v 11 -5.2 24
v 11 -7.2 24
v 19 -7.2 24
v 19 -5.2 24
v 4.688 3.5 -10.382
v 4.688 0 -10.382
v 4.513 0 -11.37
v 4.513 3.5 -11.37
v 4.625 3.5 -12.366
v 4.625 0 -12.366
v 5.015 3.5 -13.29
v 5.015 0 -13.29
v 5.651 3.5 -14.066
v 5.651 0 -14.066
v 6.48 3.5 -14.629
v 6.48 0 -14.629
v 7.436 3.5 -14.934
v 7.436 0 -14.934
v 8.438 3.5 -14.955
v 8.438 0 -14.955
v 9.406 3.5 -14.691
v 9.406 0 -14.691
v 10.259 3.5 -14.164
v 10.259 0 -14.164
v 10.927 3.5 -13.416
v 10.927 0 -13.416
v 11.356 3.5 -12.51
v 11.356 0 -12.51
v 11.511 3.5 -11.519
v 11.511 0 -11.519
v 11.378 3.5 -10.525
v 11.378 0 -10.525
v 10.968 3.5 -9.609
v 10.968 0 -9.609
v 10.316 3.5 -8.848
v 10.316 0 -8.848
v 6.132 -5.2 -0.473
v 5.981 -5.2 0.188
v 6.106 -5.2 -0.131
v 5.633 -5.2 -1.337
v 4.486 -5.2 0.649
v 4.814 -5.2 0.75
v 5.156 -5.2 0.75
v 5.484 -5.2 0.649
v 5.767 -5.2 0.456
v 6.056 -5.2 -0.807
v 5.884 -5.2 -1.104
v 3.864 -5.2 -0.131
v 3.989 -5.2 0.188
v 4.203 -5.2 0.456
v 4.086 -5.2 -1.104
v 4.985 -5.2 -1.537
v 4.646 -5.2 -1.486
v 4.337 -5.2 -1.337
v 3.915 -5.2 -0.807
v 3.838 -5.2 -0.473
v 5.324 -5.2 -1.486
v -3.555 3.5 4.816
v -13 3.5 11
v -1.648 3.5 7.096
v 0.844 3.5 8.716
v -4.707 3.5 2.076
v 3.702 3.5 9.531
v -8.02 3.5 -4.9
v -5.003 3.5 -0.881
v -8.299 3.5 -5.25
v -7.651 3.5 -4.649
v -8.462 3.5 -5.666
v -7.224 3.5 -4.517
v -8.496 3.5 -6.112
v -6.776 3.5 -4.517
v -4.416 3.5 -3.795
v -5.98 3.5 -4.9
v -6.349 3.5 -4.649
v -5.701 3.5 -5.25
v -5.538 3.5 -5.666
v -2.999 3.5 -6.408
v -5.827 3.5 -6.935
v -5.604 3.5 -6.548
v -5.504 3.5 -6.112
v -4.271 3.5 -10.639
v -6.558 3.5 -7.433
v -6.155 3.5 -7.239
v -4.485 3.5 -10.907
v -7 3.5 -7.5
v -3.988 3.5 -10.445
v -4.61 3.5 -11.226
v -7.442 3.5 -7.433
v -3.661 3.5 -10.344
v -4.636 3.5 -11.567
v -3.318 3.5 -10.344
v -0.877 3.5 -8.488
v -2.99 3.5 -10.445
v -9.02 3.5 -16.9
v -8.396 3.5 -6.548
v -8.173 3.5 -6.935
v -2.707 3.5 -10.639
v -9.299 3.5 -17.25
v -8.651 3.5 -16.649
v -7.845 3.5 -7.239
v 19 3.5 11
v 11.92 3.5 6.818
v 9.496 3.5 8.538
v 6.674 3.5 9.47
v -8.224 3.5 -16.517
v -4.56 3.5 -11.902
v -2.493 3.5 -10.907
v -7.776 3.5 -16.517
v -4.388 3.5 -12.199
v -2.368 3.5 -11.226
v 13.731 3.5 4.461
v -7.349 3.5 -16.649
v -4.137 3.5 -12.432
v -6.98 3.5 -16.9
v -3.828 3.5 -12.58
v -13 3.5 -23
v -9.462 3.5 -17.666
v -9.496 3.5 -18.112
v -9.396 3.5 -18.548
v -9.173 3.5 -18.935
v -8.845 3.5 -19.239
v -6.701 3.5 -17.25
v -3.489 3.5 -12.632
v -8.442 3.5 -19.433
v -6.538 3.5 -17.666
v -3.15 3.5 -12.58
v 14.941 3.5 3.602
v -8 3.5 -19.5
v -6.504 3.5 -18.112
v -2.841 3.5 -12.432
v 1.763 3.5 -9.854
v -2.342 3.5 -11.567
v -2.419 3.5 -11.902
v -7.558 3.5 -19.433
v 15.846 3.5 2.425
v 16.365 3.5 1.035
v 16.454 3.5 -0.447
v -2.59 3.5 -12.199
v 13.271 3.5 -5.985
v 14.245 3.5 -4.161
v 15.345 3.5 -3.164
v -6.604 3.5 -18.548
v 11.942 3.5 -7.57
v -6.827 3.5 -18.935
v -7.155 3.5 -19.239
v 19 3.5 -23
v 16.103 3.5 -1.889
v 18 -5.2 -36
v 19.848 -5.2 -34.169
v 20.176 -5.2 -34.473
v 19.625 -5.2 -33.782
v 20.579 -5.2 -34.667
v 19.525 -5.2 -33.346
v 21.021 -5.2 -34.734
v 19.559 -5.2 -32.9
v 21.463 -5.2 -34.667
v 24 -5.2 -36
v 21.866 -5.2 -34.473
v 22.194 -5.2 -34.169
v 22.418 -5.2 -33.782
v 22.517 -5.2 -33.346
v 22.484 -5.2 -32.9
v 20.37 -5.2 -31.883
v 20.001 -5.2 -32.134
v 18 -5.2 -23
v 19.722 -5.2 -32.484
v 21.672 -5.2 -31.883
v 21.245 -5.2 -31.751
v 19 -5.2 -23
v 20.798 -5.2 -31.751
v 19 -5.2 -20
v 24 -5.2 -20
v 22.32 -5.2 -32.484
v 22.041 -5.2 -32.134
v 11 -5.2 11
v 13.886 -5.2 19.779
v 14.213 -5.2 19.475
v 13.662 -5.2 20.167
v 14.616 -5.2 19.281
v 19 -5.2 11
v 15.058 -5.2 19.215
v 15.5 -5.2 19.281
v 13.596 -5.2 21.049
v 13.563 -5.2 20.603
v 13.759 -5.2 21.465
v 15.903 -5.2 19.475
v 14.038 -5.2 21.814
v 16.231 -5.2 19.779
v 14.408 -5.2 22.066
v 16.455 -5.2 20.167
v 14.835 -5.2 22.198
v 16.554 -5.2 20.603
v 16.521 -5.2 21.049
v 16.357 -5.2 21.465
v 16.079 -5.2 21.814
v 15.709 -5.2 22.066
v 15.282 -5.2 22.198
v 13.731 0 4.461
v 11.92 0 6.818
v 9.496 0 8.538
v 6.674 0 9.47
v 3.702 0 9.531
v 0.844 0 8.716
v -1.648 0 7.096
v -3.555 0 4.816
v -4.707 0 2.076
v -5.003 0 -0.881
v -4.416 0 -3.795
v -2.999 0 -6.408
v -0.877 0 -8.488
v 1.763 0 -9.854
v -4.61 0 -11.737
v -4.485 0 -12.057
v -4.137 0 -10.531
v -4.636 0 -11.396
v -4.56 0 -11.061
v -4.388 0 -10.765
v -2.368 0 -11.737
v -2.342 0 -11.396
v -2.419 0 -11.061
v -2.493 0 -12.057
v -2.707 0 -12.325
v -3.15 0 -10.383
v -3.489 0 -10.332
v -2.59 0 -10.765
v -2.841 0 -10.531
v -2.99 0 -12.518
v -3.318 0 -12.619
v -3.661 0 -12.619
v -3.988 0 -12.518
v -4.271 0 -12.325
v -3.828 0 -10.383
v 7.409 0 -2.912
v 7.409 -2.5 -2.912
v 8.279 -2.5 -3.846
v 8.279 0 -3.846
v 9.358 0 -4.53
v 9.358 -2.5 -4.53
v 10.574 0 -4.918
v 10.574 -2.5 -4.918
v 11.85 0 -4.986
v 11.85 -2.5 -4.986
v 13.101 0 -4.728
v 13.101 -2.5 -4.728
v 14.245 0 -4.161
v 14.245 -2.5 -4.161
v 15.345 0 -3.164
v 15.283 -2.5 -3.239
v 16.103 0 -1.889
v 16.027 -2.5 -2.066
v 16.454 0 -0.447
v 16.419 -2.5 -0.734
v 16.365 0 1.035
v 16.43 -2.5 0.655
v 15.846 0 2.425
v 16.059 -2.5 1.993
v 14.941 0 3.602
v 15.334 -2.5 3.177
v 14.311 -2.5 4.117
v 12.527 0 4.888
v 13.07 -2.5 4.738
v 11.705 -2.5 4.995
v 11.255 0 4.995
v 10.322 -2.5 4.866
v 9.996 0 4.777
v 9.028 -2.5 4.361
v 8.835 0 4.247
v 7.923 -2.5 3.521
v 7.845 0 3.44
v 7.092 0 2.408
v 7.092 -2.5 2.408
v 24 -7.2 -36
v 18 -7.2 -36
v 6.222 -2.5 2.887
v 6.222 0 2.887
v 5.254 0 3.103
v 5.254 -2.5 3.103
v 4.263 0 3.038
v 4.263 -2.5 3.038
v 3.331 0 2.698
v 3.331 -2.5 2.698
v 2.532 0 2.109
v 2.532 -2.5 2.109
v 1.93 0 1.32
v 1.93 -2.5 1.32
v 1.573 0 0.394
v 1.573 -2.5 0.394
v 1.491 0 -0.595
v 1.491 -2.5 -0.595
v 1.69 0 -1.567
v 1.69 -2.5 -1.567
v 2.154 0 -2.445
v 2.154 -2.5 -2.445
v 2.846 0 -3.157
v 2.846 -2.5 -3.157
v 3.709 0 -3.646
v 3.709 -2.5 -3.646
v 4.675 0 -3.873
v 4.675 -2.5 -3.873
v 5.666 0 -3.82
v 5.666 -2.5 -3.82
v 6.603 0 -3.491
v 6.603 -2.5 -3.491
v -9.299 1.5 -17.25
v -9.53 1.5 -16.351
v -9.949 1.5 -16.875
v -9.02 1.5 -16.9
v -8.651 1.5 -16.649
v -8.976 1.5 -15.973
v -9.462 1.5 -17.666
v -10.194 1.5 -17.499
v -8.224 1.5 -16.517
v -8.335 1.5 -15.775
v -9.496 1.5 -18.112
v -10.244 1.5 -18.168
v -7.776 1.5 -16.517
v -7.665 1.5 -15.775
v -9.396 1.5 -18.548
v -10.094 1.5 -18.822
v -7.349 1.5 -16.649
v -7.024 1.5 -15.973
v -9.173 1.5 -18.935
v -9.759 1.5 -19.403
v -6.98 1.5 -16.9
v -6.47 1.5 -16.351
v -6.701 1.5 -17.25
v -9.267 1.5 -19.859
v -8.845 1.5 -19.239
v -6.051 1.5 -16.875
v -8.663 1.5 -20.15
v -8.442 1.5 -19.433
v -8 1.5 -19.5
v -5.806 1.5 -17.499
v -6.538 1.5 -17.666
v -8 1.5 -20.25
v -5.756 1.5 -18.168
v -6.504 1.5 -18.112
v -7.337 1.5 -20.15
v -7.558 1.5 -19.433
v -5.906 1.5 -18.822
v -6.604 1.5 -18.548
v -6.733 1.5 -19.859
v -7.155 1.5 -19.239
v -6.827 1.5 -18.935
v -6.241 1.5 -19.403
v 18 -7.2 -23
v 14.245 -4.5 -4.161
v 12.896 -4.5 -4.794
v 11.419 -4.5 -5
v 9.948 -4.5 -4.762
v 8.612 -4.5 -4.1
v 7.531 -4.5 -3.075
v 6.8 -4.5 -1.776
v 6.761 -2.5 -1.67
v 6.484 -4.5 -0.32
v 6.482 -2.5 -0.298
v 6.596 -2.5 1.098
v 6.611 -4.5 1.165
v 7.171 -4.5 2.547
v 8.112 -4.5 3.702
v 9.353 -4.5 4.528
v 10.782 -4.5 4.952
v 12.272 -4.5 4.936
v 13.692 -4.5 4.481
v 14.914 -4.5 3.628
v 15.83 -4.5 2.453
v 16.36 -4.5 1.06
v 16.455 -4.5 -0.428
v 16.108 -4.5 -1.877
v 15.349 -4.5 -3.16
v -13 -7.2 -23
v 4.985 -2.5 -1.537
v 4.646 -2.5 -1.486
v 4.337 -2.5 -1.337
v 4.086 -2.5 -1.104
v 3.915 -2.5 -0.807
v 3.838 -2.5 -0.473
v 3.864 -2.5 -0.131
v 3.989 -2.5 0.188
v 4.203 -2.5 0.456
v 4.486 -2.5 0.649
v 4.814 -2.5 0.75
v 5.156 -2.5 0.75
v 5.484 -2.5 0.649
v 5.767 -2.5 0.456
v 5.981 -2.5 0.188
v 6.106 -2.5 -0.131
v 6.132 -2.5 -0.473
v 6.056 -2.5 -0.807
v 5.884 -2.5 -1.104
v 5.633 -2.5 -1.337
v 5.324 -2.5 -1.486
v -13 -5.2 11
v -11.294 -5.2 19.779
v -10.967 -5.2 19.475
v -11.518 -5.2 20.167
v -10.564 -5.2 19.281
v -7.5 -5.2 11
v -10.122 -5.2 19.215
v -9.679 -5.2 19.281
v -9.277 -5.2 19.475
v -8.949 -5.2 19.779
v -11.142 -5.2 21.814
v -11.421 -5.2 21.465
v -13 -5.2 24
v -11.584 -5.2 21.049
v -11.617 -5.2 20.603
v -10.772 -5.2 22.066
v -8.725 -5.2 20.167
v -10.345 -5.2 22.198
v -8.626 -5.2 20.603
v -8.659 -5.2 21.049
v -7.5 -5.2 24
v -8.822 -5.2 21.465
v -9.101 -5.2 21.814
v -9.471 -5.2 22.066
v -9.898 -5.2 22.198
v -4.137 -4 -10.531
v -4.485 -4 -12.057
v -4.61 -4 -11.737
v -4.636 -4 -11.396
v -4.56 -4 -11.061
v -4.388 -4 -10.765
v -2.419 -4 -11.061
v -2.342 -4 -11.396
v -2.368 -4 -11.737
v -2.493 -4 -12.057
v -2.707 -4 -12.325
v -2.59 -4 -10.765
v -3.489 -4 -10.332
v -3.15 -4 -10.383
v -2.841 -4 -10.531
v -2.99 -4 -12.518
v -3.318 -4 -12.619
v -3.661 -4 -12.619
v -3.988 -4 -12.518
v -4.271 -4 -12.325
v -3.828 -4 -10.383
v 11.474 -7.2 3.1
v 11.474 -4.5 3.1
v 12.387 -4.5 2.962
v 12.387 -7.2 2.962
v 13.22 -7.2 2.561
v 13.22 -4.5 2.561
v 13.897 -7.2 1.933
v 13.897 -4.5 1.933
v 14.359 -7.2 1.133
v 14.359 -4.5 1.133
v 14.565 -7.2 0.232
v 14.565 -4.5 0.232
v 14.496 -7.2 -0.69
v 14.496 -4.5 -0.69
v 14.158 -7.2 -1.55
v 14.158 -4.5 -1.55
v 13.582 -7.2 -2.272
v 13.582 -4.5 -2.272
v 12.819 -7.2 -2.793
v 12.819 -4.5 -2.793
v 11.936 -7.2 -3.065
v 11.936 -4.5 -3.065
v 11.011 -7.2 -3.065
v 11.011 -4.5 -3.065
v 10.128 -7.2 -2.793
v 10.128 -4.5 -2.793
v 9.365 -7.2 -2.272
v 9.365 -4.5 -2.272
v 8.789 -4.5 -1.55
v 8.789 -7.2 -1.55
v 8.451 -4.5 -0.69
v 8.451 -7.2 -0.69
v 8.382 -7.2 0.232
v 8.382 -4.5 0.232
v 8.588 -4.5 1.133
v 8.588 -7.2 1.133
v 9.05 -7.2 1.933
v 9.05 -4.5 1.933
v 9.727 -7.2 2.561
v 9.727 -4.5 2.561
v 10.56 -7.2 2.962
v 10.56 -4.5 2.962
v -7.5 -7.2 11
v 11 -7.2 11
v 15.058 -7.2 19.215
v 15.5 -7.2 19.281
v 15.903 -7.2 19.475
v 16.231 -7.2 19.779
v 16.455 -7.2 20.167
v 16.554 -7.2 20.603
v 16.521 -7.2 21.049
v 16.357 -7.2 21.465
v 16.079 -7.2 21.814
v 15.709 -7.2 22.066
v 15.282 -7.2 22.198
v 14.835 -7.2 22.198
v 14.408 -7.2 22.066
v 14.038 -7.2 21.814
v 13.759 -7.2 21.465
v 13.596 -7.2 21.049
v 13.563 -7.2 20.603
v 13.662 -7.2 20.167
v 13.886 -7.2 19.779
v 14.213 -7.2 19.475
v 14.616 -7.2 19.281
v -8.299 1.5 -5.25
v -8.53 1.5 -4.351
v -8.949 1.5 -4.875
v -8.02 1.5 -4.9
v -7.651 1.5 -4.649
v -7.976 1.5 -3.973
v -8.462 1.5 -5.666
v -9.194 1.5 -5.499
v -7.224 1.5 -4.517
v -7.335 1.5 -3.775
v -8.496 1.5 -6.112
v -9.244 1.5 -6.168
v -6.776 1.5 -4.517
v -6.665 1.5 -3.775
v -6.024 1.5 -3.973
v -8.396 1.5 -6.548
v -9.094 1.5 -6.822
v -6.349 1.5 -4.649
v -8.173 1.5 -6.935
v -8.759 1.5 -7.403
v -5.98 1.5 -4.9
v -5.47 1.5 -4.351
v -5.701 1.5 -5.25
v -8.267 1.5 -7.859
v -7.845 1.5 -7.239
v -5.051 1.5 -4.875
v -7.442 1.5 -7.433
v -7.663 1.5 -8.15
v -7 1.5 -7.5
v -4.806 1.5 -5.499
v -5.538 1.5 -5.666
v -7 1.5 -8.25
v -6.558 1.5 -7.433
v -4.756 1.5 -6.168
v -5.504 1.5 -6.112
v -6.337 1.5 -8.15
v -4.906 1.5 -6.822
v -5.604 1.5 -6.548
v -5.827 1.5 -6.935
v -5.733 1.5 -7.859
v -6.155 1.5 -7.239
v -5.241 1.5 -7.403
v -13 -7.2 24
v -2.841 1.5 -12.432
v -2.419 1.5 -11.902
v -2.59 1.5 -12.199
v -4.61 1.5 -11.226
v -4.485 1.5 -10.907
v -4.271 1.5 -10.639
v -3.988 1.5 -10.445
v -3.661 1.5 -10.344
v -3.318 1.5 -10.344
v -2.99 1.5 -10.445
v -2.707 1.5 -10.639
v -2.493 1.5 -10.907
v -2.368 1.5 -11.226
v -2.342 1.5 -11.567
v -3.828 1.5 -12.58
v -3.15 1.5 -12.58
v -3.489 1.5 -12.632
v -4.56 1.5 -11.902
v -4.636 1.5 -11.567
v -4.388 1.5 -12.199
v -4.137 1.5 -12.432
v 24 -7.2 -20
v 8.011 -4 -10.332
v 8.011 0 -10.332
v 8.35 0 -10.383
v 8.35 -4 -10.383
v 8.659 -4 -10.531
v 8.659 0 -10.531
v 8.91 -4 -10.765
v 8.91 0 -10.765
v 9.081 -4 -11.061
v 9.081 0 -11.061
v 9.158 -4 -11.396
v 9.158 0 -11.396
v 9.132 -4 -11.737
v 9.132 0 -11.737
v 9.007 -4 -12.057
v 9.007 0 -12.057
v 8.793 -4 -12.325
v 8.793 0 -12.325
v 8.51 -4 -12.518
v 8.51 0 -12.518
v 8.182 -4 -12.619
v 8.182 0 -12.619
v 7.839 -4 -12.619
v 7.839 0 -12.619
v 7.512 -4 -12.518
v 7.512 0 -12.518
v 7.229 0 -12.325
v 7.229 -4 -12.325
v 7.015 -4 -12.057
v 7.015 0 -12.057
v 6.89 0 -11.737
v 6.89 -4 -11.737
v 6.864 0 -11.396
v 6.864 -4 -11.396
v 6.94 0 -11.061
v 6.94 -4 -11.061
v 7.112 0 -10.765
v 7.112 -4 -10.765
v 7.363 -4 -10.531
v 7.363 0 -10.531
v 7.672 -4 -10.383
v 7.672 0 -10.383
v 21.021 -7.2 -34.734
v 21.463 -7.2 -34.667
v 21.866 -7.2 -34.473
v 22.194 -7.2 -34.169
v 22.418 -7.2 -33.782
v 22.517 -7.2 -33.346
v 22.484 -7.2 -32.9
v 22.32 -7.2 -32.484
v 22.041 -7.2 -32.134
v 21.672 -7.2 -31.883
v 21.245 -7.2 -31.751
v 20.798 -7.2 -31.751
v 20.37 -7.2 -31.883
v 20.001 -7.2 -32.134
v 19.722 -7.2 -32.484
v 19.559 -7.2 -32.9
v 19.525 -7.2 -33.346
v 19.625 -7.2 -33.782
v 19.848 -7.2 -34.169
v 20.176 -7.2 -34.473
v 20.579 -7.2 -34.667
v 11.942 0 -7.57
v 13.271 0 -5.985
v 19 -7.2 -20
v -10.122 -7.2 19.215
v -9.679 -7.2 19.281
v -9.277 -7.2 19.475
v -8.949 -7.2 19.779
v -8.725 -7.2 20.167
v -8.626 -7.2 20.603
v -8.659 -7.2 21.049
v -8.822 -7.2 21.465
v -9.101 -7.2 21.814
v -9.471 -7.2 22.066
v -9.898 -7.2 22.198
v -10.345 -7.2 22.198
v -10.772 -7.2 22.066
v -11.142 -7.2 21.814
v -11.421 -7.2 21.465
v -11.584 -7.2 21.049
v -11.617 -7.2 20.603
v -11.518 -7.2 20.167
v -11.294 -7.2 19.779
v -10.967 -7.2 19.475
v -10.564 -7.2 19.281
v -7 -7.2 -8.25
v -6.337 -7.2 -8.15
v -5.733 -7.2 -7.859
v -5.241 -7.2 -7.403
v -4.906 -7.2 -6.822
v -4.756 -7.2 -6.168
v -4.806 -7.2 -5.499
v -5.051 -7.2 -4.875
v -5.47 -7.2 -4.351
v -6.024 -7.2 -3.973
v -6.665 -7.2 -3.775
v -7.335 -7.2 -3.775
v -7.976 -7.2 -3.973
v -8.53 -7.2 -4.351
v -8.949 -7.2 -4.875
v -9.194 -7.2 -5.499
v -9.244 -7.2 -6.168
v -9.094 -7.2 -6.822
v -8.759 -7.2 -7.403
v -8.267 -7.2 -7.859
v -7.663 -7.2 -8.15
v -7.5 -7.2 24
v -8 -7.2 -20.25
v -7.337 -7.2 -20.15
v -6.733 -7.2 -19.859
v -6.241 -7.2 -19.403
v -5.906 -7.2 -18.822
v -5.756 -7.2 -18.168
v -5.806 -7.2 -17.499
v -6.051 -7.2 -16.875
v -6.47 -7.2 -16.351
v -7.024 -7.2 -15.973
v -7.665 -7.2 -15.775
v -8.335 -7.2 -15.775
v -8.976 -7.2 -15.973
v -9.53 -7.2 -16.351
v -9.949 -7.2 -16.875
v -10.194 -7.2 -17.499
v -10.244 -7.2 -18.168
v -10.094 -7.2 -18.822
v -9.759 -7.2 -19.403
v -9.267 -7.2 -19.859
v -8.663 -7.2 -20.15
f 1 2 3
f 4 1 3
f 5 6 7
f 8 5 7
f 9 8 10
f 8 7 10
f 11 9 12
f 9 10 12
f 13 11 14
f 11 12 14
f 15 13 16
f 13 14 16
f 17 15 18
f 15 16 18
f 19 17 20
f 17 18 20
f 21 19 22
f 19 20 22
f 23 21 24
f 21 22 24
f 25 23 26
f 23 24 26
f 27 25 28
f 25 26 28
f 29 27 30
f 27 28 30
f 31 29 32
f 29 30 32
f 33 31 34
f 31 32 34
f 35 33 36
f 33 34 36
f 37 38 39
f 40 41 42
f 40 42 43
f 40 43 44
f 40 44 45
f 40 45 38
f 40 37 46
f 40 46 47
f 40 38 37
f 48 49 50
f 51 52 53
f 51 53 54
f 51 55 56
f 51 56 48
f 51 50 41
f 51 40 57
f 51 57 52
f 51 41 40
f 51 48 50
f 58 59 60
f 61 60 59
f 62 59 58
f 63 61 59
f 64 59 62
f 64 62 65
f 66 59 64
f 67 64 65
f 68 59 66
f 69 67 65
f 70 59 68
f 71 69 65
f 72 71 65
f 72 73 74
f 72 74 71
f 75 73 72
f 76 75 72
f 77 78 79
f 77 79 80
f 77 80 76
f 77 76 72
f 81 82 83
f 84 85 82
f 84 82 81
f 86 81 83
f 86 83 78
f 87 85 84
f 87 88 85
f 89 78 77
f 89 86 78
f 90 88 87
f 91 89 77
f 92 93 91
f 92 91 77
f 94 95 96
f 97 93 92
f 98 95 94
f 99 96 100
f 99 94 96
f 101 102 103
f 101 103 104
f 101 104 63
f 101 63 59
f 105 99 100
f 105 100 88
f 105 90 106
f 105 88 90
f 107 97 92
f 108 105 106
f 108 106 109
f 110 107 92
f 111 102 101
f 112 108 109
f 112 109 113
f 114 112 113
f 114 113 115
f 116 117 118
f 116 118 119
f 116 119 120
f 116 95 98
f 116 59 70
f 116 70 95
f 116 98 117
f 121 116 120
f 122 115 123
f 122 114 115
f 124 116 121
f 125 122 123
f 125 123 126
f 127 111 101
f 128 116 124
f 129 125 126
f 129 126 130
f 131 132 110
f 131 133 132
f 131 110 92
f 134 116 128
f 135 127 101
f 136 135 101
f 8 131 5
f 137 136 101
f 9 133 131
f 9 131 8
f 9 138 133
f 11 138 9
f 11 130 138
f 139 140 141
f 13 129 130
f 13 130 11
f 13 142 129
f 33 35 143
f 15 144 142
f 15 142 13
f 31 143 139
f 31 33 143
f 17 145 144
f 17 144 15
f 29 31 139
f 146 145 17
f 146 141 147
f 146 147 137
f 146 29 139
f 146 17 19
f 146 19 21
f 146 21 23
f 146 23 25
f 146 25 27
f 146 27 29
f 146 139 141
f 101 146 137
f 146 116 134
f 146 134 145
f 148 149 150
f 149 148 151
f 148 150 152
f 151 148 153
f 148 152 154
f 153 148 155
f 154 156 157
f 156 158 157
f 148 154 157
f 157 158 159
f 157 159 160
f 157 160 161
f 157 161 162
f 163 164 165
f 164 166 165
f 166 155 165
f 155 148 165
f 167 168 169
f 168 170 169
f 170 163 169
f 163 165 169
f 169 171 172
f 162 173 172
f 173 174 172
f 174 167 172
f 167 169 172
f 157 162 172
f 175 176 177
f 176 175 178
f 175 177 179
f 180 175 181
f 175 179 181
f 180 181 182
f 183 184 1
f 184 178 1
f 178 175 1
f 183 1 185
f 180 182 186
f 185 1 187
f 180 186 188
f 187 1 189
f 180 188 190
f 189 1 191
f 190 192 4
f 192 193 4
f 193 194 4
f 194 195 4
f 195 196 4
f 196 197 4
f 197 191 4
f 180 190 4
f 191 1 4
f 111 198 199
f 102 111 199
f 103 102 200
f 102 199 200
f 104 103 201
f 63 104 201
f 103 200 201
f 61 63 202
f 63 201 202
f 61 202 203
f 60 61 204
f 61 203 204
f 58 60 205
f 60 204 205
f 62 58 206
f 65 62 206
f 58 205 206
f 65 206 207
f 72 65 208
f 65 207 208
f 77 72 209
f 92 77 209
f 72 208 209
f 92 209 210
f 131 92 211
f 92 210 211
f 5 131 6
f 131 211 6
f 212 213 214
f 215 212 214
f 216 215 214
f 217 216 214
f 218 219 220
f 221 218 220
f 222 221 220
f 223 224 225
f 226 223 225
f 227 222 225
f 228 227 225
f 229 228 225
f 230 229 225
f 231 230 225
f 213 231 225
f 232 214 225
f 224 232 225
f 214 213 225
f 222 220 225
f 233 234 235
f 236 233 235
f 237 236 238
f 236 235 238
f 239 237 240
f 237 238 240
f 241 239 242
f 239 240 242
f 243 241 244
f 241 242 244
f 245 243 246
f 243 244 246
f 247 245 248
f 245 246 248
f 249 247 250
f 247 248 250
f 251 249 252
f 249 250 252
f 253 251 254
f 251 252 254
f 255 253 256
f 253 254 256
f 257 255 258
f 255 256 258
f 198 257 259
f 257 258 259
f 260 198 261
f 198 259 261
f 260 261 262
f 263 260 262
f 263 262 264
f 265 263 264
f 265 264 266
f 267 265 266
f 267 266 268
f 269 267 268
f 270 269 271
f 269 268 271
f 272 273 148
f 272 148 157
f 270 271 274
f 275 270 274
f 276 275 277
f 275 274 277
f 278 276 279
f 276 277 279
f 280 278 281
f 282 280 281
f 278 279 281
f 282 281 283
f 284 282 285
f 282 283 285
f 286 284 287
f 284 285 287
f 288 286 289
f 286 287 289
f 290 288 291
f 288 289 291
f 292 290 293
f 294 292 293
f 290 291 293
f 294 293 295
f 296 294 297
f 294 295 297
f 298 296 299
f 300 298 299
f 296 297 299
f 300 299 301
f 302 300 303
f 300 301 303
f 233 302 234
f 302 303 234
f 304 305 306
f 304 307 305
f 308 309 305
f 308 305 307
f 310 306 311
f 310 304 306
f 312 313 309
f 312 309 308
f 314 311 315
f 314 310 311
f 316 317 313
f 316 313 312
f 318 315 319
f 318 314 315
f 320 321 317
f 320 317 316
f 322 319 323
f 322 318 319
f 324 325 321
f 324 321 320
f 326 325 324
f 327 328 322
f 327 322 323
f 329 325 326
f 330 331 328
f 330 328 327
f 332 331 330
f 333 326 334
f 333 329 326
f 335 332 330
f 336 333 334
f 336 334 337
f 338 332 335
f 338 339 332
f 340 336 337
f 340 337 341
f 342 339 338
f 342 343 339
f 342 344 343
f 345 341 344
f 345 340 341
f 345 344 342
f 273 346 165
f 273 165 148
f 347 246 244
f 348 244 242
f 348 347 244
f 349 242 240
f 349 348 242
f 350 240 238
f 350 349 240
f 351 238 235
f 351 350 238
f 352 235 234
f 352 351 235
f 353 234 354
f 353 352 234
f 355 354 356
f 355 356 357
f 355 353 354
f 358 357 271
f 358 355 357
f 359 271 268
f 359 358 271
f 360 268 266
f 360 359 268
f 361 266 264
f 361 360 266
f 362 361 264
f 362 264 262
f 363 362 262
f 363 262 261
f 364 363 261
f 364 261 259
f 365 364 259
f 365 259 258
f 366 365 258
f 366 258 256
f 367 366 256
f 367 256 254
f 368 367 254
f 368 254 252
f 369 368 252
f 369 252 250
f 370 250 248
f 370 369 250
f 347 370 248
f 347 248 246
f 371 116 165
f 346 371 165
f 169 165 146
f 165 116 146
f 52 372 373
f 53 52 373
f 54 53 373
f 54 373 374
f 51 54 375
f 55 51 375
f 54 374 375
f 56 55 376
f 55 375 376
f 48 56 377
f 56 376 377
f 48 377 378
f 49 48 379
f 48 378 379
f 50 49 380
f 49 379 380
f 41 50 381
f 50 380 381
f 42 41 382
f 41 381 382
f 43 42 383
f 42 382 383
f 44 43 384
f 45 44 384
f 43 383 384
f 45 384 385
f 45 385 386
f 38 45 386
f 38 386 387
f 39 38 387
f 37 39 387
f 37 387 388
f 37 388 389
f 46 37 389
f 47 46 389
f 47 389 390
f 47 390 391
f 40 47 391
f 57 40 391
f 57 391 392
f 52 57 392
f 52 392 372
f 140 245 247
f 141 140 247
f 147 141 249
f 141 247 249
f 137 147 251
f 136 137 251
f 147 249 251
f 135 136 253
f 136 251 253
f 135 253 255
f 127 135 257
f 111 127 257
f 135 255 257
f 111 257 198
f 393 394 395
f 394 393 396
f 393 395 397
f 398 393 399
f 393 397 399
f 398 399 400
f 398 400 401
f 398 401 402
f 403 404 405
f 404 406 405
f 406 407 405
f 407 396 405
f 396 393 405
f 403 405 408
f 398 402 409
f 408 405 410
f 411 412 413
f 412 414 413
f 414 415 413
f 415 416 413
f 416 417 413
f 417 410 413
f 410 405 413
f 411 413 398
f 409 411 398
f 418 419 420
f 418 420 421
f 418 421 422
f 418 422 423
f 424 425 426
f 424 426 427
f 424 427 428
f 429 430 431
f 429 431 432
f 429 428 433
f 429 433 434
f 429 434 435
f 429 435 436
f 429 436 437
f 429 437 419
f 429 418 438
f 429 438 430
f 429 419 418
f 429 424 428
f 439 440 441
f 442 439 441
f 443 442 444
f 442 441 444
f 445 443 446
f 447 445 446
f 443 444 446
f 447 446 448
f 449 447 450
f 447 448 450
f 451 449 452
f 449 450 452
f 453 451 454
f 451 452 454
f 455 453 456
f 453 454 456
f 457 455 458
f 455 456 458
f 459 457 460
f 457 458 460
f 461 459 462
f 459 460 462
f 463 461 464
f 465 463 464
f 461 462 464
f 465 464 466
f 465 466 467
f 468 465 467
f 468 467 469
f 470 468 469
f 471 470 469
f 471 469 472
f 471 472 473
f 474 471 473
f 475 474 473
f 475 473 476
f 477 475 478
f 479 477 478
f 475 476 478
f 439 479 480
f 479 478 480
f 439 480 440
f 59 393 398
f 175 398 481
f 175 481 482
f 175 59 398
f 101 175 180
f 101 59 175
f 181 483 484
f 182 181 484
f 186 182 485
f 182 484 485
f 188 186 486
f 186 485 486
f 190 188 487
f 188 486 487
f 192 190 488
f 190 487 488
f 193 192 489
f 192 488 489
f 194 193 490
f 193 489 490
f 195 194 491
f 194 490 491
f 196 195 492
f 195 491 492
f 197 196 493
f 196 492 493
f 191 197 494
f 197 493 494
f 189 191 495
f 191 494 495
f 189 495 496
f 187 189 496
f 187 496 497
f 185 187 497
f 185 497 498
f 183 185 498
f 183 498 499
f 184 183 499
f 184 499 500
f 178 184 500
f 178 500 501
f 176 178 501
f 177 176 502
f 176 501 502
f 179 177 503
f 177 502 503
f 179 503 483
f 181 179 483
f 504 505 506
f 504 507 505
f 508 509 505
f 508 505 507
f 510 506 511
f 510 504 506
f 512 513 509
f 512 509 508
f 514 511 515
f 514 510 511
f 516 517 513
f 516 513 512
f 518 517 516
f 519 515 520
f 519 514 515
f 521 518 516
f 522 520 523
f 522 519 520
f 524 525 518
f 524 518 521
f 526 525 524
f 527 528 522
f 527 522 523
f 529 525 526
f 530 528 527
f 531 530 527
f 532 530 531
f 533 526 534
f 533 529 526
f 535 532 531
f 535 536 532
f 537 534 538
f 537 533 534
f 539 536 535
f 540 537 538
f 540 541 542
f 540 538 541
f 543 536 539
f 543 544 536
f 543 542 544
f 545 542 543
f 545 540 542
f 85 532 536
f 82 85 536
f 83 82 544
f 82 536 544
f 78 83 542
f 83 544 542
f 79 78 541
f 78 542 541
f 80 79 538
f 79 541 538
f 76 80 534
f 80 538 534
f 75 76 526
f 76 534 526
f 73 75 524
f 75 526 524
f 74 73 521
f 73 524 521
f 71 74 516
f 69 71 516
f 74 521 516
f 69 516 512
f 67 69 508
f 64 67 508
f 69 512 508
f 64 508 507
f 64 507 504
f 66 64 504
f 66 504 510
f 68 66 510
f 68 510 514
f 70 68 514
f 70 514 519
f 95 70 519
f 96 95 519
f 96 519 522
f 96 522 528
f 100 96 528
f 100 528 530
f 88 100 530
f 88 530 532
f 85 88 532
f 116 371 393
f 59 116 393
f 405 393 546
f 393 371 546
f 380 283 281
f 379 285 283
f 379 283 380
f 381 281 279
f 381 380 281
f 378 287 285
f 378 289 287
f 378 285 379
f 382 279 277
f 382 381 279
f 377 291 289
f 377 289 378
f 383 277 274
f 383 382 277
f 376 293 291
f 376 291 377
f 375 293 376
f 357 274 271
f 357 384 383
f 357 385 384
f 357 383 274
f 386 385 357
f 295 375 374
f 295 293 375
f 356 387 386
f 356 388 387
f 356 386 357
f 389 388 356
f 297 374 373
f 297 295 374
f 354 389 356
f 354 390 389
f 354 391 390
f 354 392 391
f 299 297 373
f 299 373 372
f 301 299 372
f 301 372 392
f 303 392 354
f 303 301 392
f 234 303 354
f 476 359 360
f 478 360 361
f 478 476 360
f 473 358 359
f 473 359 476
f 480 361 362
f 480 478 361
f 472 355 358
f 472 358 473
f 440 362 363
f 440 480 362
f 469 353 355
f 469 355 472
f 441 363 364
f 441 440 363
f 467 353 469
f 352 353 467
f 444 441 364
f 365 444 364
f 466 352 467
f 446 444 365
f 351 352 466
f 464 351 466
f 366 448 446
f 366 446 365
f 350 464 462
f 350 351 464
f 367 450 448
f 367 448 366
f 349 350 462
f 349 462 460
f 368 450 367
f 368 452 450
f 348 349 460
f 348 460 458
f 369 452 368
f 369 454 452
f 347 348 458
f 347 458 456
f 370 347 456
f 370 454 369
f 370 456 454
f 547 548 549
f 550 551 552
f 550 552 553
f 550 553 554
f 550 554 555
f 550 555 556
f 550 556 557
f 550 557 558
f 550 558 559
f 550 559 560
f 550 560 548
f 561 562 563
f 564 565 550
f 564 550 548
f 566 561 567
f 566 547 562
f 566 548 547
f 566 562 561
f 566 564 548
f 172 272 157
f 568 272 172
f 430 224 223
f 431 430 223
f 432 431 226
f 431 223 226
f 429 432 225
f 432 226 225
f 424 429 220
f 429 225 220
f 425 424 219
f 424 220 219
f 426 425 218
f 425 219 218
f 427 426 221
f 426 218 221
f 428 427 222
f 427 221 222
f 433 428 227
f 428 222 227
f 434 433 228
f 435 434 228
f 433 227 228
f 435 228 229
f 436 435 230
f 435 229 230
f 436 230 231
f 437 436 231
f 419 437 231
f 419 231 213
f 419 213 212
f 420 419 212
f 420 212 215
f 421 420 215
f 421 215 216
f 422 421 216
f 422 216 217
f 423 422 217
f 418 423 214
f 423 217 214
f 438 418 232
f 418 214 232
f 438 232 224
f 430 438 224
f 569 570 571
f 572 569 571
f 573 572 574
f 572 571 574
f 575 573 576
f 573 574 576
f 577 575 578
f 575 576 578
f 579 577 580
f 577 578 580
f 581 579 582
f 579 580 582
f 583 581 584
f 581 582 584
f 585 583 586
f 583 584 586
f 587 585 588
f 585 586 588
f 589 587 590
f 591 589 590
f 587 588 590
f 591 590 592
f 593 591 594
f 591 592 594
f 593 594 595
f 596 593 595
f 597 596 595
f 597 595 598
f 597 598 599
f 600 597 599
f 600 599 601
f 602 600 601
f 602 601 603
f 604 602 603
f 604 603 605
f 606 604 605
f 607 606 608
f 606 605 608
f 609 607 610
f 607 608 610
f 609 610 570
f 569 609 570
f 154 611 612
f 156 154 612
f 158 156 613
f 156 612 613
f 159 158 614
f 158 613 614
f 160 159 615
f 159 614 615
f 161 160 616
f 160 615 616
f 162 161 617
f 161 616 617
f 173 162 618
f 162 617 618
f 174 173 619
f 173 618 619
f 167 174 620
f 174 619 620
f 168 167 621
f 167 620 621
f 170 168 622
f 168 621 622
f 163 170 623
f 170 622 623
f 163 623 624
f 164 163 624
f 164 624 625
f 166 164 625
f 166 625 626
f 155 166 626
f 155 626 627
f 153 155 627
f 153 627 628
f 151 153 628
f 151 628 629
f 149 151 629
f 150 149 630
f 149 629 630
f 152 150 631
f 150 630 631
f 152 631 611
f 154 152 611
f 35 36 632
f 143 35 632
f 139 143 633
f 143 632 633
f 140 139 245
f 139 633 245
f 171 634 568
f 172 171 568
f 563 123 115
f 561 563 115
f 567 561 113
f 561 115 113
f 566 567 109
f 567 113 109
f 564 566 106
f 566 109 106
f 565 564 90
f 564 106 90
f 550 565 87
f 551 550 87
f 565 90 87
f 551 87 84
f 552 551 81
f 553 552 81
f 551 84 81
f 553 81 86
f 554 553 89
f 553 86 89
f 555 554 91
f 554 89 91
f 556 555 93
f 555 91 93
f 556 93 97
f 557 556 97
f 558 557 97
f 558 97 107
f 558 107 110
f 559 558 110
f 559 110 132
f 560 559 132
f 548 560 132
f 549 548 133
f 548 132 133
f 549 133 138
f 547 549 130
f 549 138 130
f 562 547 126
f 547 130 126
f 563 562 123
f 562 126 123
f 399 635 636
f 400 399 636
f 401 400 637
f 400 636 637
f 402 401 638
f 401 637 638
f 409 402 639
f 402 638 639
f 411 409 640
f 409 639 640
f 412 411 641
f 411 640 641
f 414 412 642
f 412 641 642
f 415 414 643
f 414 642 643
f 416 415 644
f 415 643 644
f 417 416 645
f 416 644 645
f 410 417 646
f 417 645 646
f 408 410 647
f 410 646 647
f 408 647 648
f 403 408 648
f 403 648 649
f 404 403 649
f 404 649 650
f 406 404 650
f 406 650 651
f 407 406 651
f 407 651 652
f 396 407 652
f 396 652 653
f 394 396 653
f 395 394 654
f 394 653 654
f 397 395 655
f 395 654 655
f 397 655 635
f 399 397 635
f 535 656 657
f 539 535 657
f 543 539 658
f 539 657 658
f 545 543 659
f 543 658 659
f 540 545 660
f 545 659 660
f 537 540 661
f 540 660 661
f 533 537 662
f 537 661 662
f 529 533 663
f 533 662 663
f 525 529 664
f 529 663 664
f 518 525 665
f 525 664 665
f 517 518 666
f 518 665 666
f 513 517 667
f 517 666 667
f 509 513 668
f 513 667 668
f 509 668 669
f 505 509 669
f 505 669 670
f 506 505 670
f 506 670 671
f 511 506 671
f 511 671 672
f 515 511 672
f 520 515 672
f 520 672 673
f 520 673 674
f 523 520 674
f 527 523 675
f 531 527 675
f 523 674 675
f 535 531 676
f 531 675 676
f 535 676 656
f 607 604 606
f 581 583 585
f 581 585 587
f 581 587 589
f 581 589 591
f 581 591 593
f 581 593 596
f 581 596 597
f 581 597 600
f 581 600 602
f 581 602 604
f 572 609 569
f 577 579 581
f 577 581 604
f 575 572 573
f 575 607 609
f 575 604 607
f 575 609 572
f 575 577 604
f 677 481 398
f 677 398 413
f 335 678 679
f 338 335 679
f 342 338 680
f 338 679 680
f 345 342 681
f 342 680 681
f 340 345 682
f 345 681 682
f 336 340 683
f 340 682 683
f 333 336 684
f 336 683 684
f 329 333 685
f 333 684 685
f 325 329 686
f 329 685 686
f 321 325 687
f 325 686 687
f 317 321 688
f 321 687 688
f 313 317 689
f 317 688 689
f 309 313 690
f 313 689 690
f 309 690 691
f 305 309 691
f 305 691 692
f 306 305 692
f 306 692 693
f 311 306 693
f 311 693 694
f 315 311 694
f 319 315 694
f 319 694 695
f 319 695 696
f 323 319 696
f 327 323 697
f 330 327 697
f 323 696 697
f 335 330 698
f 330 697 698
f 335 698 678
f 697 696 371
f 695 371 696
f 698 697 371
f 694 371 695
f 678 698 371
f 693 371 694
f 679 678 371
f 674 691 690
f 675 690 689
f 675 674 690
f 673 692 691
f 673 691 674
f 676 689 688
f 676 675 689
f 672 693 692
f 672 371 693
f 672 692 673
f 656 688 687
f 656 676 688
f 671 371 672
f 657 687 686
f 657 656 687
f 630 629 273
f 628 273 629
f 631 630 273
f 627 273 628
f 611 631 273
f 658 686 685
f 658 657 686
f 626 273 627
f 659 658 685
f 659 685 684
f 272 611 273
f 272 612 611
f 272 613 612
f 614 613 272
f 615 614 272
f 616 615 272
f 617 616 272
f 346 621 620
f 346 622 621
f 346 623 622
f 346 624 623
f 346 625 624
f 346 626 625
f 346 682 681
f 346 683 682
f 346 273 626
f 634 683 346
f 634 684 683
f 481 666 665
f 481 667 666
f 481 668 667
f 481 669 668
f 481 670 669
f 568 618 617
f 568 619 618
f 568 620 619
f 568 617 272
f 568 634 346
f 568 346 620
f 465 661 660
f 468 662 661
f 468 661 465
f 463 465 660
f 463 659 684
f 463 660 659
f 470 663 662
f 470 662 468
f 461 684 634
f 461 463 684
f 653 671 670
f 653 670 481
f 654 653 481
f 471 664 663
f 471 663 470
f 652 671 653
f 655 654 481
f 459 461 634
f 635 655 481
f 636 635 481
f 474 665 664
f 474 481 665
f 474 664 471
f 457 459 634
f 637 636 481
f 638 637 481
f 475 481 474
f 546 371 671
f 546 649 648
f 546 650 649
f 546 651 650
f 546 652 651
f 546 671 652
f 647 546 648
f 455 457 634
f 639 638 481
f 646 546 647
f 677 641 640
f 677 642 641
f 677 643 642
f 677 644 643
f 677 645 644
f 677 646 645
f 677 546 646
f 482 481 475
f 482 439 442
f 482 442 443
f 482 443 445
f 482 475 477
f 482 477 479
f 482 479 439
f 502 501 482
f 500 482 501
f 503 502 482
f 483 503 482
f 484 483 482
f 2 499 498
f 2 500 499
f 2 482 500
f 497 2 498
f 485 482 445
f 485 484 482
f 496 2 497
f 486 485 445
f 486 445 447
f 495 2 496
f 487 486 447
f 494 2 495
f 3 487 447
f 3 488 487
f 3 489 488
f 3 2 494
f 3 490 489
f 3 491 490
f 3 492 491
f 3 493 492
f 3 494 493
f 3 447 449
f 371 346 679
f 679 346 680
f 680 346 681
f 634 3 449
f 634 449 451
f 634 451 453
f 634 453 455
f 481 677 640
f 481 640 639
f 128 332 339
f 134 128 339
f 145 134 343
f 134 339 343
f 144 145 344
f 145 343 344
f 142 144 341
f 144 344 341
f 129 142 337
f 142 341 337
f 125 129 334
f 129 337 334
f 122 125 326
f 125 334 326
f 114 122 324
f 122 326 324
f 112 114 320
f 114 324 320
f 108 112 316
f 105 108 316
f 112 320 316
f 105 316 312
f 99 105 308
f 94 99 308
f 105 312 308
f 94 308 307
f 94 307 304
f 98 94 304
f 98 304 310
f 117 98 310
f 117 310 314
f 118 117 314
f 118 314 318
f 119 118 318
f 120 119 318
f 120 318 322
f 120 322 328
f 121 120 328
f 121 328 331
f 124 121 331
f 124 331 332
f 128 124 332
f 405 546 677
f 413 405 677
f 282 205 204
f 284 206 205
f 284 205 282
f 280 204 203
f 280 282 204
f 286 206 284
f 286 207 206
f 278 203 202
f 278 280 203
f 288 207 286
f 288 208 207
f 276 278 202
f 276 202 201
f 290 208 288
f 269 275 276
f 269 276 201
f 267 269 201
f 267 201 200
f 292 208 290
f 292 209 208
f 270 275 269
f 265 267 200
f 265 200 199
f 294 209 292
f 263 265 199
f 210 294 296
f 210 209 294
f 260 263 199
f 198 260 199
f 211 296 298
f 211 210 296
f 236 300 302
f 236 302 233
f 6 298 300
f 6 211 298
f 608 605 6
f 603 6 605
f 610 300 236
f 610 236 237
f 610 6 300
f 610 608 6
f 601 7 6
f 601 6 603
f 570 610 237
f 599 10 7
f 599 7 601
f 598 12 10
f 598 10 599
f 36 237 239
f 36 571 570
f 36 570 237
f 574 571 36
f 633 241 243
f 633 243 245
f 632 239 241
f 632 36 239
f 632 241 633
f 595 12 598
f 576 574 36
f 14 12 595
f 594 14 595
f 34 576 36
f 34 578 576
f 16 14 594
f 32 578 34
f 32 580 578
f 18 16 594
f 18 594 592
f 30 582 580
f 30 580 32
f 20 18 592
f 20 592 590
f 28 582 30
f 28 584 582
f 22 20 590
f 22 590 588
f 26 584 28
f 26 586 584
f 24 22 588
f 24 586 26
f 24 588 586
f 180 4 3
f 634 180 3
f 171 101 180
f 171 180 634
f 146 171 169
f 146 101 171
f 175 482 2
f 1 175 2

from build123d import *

# Parameters (mm, degrees)
SKETCH_1_W          = 32
SKETCH_1_H          = 34
EXTRUDE_1_DEPTH     = 3.5
EXTRUDE_START       = -2.5
SKETCH_1_30_W       = 32
SKETCH_1_30_H       = 34
EXTRUDE_2_DEPTH     = 2.5
EXTRUDE_START_2     = -4.5
SKETCH_1_31_W       = 32
SKETCH_1_31_H       = 34
SKETCH_1_31_R       = 5
EXTRUDE_3_DEPTH     = 2
SKETCH_1_32_W       = 32
SKETCH_1_32_H       = 34
SKETCH_1_32_R       = 3.1
EXTRUDE_4_DEPTH     = 2.7
SKETCH_2_R          = 1.5
CUT_EXTRUDE_1_DEPTH = 32.693690224
SKETCH_2_3_R        = 2.25
CUT_EXTRUDE_2_DEPTH = 8.7
SKETCH_1_33_R       = 1.15
CUT_EXTRUDE_3_DEPTH = 4
SKETCH_3_W          = 5.5
SKETCH_3_H          = 13
SKETCH_3_R          = 1.5
SKETCH_3_W_2        = 8
SKETCH_3_W_3        = 5
SKETCH_3_H_2        = 3
EXTRUDE_5_DEPTH     = 2
SKETCH_1_34_R       = 1.15
CUT_EXTRUDE_4_DEPTH = 5.2
CUT_EXTRUDE_START   = 3.5
SKETCH_1_37_R       = 1.15
CUT_EXTRUDE_6_DEPTH = 2


with BuildPart() as part:
    # 草图1 → 凸台-拉伸1 (new body)
    with BuildSketch(Plane(origin=(0, 0, 0), x_dir=(1, 0, 0), z_dir=(0, 1, 0))):
        with Locations((3, 6)):
            Rectangle(SKETCH_1_W, SKETCH_1_H)
        with BuildLine():
            ThreePointArc((13.731280316, -4.4612147), (-3.554893366, -4.816108921), (4.687954327, 10.382351934))
            ThreePointArc((4.687954327, 10.382351934), (8.931780662, 14.858222386), (10.315634647, 8.847529713))
            ThreePointArc((10.315634647, 8.847529713), (12.64747139, 6.812247403), (14.245257691, 4.161414399))
            ThreePointArc((14.245257691, 4.161414399), (16.464642722, -0.297511749), (13.731280316, -4.4612147))
        make_face(mode=Mode.SUBTRACT)
    extrude(amount=EXTRUDE_1_DEPTH)

    # 草图1<30> → 凸台-拉伸2 (add)
    with BuildSketch(Plane(origin=(0, 0, 0), x_dir=(1, 0, 0), z_dir=(0, 1, 0)).offset(EXTRUDE_START)):
        with Locations((3, 6)):
            Rectangle(SKETCH_1_30_W, SKETCH_1_30_H)
        with BuildLine():
            ThreePointArc((7.408784414, 2.911712865), (16.464642722, -0.297511749), (7.091673359, -2.408231444))
            ThreePointArc((7.091673359, -2.408231444), (1.49122024, 0.595023498), (7.408784414, 2.911712865))
        make_face(mode=Mode.SUBTRACT)
    extrude(amount=EXTRUDE_2_DEPTH)

    # 草图1<31> → 凸台-拉伸3 (add)
    with BuildSketch(Plane(origin=(0, 0, 0), x_dir=(1, 0, 0), z_dir=(0, 1, 0)).offset(EXTRUDE_START_2)):
        with Locations((3, 6)):
            Rectangle(SKETCH_1_31_W, SKETCH_1_31_H)
        with Locations(Location((11.473501894, 0, 0), (0, 0, 56.333964125))):
            Circle(SKETCH_1_31_R, mode=Mode.SUBTRACT)
    extrude(amount=EXTRUDE_3_DEPTH)

    # 草图1<32> → 凸台-拉伸4 (add)
    with BuildSketch(Plane(origin=(0, 0, 0), x_dir=(1, 0, 0), z_dir=(0, 1, 0)).offset(EXTRUDE_START_2)):
        with Locations((3, 6)):
            Rectangle(SKETCH_1_32_W, SKETCH_1_32_H)
        with Locations(Location((11.473501894, 0, 0), (0, 0, 270))):
            Circle(SKETCH_1_32_R, mode=Mode.SUBTRACT)
    extrude(amount=-EXTRUDE_4_DEPTH)

    # 草图2 → 切除-拉伸1 (cut, through all)
    with BuildSketch(Plane.XZ.offset(7.2)):
        with Locations(Location((-8, -18, 0), (0, 0, 270))):
            Circle(SKETCH_2_R)
        with Locations(Location((-7, -6, 0), (0, 0, 270))):
            Circle(SKETCH_2_R)
    extrude(amount=-CUT_EXTRUDE_1_DEPTH, mode=Mode.SUBTRACT)

    # 草图2<3> → 切除-拉伸2 (cut)
    with BuildSketch(Plane.XZ.offset(7.2)):
        with Locations(Location((-8, -18, 0), (0, 0, 270))):
            Circle(SKETCH_2_3_R)
        with Locations(Location((-7, -6, 0), (0, 0, 270))):
            Circle(SKETCH_2_3_R)
    extrude(amount=-CUT_EXTRUDE_2_DEPTH, mode=Mode.SUBTRACT)

    # 草图1<33> → 切除-拉伸3 (cut)
    with BuildSketch(Plane(origin=(0, 0, 0), x_dir=(1, 0, 0), z_dir=(0, 1, 0))):
        with Locations(Location((-3.489130435, 11.48154906, 0), (0, 0, 270))):
            Circle(SKETCH_1_33_R)
        with Locations(Location((8.010869565, 11.48154906, 0), (0, 0, 270))):
            Circle(SKETCH_1_33_R)
    extrude(amount=-CUT_EXTRUDE_3_DEPTH, mode=Mode.SUBTRACT)

    # 草图3 → 凸台-拉伸5 (add)
    # profile 1 of 4: a face of its own
    with BuildSketch(Plane.XZ.offset(7.2)):
        with Locations((-10.25, 17.5)):
            Rectangle(SKETCH_3_W, SKETCH_3_H)
        with Locations(Location((-10.12152848, 20.714718626, 0), (0, 0, 270))):
            Circle(SKETCH_3_R, mode=Mode.SUBTRACT)
    # profile 2 of 4: a face of its own
    with BuildSketch(Plane.XZ.offset(7.2)):
        with Locations((15, 17.5)):
            Rectangle(SKETCH_3_W_2, SKETCH_3_H)
        with Locations(Location((15.05833067, 20.714718626, 0), (0, 0, 270))):
            Circle(SKETCH_3_R, mode=Mode.SUBTRACT)
    # profile 3 of 4: a face of its own
    with BuildSketch(Plane.XZ.offset(7.2)):
        Polygon((19, -23), (18, -23), (18, -36), (24, -36), (24, -23), align=None)
        with Locations(Location((21.021229109, -33.234018716, 0), (0, 0, 270))):
            Circle(SKETCH_3_R, mode=Mode.SUBTRACT)
    # profile 4 of 4: a face of its own
    with BuildSketch(Plane.XZ.offset(7.2)):
        with Locations((21.5, -21.5)):
            Rectangle(SKETCH_3_W_3, SKETCH_3_H_2)
    extrude(amount=-EXTRUDE_5_DEPTH)

    # 草图1<34> → 切除-拉伸4 (cut)
    with BuildSketch(Plane(origin=(0, 0, 0), x_dir=(1, 0, 0), z_dir=(0, 1, 0))):
        with Locations(Location((4.985018819, 0.386765274, 0), (0, 0, 90))):
            Circle(SKETCH_1_34_R)
    extrude(amount=-CUT_EXTRUDE_4_DEPTH, mode=Mode.SUBTRACT)

    # 草图1<37> → 切除-拉伸6 (cut)
    with BuildSketch(Plane(origin=(0, 0, 0), x_dir=(1, 0, 0), z_dir=(0, 1, 0)).offset(CUT_EXTRUDE_START)):
        with Locations(Location((-3.489130435, 11.48154906, 0), (0, 0, 90))):
            Circle(SKETCH_1_37_R)
    extrude(amount=-CUT_EXTRUDE_6_DEPTH, mode=Mode.SUBTRACT)


solid = part.part
